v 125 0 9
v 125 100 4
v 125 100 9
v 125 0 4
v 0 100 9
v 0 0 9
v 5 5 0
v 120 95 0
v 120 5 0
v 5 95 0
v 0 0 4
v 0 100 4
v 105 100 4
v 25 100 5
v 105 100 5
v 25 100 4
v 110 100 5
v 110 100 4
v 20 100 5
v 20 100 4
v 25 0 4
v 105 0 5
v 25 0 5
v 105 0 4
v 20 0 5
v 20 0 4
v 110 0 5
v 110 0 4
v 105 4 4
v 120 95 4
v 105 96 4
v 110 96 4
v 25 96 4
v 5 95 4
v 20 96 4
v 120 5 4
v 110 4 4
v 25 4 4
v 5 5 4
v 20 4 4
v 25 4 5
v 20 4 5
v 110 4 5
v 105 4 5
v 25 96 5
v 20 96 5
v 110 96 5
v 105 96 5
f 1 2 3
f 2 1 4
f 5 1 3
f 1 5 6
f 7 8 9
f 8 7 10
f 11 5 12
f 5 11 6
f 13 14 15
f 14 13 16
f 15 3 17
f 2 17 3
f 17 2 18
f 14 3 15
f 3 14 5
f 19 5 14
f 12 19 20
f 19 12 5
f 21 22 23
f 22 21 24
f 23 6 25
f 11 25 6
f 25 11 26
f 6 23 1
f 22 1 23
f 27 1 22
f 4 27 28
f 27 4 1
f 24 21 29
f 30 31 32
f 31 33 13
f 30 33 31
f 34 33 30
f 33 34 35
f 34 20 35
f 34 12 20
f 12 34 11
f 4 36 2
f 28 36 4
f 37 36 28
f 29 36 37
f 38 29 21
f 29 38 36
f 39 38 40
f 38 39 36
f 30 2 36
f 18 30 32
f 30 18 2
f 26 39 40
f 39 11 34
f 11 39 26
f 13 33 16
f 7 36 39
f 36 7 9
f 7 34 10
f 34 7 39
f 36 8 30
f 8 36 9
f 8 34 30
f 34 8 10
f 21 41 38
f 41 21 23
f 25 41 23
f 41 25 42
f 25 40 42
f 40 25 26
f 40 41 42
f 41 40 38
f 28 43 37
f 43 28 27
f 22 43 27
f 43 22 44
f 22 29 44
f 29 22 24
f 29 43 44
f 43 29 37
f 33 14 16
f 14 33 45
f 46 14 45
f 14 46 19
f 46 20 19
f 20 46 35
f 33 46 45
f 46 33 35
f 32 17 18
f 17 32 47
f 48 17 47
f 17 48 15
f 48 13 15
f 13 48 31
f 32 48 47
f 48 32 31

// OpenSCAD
// file: hEX-hAP-Vars.scad
InnerW=115;
InnerD=90;
LipH=4;
Wall=5;
TabX=20;

DW=Wall*2;
OuterW=InnerW+DW;
OuterD=InnerD+DW;
Buff=1;
DB=Buff*2;
// main file
include <hEX-hAP-Vars.scad>;
OuterH=LipH+Wall;


difference()
{
  cube([OuterW,OuterD,OuterH]);
    //Stacking lip
  translate([-Buff,-Buff,-Buff]) cube([OuterW+DB+Buff,Wall+Buff,LipH+Buff]);
  translate([-Buff,-Buff,-Buff]) cube([Wall+Buff,OuterD+DB,LipH+Buff]);
  translate([OuterW-Wall,-Buff,-Buff]) cube([Wall+Buff,OuterD+Buff,LipH+Buff]);
  translate([-Buff,OuterD-Wall,-Buff]) cube([OuterW+DW+Buff,Wall+DB+Buff,LipH+Buff]);
  // Prytabs
  translate([TabX,-Buff,LipH-Buff]) cube([Wall,Wall,DB]);
  translate([OuterW-TabX,-Buff,LipH-Buff]) cube([Wall,Wall,DB]);
  translate([TabX,InnerD+Wall+Buff,LipH-Buff]) cube([Wall,Wall,DB]);
  translate([OuterW-TabX,InnerD+Wall+Buff,LipH-Buff]) cube([Wall,Wall,DB]);
}
